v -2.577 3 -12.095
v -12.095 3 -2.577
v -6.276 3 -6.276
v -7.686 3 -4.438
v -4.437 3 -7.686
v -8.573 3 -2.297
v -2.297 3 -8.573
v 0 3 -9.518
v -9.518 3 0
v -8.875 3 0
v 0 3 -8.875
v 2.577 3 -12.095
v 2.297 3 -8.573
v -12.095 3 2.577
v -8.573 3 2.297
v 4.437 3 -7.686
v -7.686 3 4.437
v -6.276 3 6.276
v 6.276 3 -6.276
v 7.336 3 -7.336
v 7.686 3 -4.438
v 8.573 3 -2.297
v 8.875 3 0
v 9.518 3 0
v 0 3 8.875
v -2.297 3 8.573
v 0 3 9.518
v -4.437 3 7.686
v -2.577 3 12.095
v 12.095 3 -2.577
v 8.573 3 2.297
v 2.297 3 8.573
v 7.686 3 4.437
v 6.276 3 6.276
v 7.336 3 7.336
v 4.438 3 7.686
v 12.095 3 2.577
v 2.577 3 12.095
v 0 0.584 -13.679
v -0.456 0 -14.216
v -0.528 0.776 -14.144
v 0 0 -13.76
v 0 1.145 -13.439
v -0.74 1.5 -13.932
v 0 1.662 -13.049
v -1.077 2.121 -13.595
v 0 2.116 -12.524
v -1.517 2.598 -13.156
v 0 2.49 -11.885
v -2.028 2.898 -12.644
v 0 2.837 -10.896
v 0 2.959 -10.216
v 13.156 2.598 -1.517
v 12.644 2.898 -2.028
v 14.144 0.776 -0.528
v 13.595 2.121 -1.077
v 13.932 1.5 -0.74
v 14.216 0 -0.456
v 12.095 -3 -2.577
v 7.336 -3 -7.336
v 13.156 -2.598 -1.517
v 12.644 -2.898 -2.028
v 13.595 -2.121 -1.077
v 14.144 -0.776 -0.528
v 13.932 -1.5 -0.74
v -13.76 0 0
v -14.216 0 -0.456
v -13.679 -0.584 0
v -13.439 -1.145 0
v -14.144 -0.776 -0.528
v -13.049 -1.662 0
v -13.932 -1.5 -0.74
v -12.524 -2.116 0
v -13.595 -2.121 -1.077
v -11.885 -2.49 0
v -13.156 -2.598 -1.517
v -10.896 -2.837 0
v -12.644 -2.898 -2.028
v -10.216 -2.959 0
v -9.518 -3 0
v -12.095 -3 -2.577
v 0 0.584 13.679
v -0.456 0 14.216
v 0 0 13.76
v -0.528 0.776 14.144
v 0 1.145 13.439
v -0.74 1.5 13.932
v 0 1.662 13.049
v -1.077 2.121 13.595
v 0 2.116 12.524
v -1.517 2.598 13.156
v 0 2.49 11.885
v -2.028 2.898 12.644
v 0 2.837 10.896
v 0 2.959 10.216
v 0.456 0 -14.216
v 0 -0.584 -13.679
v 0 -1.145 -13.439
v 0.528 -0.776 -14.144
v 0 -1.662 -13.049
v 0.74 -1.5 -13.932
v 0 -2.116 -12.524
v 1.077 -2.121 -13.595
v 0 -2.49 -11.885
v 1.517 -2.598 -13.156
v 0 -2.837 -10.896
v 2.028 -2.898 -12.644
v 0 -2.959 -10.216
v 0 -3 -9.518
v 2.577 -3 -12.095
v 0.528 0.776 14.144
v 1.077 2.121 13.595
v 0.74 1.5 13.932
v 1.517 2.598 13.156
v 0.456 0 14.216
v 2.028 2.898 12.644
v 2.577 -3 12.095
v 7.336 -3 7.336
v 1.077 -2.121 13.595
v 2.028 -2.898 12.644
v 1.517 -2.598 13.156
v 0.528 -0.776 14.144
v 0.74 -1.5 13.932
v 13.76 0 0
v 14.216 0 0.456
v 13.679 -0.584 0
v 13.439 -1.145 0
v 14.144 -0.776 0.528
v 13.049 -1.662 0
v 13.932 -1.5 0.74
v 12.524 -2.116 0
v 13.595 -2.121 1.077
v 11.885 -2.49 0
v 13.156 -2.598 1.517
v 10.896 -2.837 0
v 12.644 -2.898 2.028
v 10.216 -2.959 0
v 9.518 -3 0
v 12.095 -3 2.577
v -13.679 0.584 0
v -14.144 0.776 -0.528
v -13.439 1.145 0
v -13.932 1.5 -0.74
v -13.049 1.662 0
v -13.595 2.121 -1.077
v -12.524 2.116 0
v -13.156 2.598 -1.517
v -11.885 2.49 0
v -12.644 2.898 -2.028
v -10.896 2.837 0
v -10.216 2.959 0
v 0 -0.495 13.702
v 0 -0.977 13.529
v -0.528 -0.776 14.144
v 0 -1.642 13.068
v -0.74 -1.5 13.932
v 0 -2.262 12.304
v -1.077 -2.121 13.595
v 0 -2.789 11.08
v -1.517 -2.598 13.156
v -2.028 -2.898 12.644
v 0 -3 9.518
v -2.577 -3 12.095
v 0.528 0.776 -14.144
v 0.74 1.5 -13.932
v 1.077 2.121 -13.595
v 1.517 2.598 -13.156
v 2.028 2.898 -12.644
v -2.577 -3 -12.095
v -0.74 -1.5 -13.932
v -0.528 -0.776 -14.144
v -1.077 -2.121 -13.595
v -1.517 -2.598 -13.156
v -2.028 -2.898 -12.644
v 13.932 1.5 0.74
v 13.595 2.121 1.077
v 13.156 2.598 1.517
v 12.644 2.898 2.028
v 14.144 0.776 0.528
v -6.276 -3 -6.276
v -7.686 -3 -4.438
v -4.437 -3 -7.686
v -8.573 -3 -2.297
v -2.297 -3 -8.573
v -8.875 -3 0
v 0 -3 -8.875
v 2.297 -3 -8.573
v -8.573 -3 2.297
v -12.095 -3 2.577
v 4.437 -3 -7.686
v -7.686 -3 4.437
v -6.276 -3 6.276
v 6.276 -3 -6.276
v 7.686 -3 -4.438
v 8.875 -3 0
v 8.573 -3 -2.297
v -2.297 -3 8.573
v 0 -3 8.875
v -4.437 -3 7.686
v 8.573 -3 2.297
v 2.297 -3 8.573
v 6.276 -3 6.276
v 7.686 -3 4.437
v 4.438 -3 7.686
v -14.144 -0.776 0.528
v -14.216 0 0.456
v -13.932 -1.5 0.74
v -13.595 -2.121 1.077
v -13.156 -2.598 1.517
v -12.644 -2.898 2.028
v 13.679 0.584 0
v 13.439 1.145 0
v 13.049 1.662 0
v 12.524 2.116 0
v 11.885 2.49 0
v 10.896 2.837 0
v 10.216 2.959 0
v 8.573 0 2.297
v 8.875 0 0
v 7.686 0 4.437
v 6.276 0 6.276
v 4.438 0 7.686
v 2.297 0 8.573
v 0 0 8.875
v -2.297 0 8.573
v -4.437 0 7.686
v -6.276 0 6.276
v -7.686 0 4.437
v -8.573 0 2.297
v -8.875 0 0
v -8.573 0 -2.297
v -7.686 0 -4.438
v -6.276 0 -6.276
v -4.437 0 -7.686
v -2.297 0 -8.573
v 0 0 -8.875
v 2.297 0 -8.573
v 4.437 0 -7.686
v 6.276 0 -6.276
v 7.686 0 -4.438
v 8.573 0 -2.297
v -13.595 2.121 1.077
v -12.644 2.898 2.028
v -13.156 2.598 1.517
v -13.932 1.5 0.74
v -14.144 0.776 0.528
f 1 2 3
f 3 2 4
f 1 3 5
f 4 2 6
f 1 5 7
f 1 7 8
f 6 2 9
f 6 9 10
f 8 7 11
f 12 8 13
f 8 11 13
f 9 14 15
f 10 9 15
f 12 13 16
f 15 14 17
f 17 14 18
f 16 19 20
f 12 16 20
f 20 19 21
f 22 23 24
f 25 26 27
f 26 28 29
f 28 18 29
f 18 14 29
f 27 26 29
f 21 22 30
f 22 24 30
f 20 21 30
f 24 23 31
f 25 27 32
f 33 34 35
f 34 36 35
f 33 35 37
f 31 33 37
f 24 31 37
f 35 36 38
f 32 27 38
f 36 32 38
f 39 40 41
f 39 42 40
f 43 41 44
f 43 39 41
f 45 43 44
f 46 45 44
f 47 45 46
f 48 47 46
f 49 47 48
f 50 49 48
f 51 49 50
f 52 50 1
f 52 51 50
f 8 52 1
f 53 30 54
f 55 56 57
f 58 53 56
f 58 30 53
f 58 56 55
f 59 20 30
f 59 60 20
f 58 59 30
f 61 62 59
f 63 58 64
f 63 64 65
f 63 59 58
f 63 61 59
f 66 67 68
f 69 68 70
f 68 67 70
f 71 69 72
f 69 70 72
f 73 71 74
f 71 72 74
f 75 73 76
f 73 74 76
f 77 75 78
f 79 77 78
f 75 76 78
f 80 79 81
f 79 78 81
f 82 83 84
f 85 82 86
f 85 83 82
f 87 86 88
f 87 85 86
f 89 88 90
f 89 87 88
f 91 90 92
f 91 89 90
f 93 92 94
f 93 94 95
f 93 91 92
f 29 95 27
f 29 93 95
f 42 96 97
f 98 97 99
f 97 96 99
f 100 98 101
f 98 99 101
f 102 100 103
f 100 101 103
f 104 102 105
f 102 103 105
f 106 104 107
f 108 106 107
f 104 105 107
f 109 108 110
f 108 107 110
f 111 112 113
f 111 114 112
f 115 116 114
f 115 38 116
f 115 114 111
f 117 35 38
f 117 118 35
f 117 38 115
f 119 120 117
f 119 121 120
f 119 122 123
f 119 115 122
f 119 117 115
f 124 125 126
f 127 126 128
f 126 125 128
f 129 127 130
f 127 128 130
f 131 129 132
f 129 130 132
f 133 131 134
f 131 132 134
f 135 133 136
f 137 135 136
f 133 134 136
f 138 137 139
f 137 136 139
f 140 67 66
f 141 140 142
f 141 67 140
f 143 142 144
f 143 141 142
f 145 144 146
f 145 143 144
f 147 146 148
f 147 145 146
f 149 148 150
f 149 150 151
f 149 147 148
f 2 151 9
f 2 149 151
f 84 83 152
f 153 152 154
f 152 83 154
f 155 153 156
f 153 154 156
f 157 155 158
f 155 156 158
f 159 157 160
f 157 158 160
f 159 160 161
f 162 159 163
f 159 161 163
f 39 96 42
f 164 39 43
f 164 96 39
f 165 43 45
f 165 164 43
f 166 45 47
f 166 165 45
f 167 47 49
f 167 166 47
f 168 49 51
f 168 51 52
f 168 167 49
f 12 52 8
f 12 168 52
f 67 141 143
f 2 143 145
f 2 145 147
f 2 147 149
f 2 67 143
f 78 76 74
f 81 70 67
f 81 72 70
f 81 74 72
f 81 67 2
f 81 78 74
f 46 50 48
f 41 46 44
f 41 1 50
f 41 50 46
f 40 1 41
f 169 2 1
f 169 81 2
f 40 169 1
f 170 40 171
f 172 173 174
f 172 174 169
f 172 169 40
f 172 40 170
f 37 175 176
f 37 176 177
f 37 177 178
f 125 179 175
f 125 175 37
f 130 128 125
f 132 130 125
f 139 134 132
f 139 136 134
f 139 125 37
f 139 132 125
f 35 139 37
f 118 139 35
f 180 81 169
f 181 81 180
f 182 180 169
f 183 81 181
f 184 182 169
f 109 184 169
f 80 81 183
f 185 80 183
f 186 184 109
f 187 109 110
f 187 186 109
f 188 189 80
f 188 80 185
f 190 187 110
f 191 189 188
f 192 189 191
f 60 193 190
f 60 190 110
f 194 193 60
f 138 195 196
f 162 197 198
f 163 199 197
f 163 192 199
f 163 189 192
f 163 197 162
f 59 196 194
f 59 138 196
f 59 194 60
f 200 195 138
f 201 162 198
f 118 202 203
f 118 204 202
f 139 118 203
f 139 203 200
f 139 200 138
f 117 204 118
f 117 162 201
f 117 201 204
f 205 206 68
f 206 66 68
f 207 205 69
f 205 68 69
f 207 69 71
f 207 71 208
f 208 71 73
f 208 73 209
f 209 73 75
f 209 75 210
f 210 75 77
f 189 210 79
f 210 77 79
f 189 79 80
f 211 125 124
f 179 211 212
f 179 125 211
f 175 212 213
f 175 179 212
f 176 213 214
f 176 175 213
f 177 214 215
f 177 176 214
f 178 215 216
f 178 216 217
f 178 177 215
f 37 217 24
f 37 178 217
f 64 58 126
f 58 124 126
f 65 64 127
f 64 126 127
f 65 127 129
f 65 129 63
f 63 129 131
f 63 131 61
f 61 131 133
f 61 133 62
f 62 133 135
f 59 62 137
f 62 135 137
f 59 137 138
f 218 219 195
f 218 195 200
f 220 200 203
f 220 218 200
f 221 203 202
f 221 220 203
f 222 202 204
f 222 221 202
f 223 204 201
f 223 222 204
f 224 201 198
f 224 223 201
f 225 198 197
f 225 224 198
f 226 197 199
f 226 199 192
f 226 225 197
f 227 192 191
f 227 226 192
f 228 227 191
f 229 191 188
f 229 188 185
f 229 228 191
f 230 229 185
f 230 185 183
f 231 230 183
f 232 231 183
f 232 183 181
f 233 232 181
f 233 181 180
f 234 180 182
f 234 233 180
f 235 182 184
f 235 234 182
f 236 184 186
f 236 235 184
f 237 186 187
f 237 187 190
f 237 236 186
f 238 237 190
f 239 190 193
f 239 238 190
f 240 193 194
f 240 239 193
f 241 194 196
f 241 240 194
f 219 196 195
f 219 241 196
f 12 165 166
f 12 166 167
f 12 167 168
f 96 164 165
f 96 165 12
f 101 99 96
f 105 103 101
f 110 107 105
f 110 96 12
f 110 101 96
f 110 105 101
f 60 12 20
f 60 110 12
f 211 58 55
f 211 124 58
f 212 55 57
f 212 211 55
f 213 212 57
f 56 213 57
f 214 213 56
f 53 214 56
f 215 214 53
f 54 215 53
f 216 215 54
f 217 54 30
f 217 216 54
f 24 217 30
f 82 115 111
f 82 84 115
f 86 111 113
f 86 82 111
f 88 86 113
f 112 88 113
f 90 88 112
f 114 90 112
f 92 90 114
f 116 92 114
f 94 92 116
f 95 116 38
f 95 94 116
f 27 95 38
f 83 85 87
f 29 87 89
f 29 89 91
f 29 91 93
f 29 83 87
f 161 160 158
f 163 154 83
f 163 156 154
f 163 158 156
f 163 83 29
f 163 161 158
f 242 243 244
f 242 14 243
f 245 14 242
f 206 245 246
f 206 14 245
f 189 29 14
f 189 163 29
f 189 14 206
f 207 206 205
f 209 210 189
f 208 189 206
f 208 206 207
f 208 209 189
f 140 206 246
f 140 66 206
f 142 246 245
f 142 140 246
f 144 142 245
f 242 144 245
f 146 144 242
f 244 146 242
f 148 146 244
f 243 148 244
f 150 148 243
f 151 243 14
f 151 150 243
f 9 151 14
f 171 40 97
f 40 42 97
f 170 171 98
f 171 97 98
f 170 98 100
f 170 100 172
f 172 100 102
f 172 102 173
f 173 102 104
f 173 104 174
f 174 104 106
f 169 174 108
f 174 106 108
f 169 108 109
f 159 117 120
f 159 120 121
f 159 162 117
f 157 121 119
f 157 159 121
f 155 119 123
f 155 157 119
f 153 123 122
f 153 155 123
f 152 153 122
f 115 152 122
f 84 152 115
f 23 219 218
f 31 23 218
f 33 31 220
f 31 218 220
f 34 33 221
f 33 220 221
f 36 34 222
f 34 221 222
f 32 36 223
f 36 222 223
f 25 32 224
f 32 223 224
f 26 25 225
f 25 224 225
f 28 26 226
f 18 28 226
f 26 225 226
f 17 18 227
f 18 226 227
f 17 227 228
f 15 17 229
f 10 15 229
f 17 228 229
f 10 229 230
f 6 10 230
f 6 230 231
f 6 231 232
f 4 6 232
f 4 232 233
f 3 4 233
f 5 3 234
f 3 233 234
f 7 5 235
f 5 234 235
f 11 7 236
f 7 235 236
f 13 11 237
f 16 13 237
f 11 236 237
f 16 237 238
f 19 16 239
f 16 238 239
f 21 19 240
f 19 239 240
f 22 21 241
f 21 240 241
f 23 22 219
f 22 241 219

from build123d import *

# Parameters (mm, degrees)
F0_R          = 8.875
F1_DEPTH      = 3
F1_DEPTH_BACK = 3
F2_R          = 2.99999


# Not quite as in the source:
# - a fillet or chamfer is up to 0.001 mm smaller than in the source, because OpenCascade refuses the exact size


with BuildPart() as f1:
    # F0 (on Front) → F1 (new body, two sides)
    with BuildSketch(Plane.XZ) as f1_sk:
        with BuildLine():
            ThreePointArc((-7.3362328356, 7.3362328741), (1.36e-08, 10.375), (7.3362328548, 7.3362328548))
            Line((7.3362328548, 7.3362328548), (0.4560838739, 14.2163818358))
            Line((0.4560838739, 14.2163818358), (0, 13.7602979619))
            Line((0, 13.7602979619), (-0.4560838739, 14.2163818358))
            Line((-0.4560838739, 14.2163818358), (-7.3362328356, 7.3362328741))
        make_face()
        with BuildLine():
            ThreePointArc((-7.3362328073, -7.3362329024), (-10.375, -2e-08), (-7.3362328356, 7.3362328741))
            Line((-7.3362328356, 7.3362328741), (-14.2163818358, 0.4560838739))
            Line((-14.2163818358, 0.4560838739), (-13.7602979619, 0))
            Line((-13.7602979619, 0), (-14.2163818358, -0.4560838739))
            Line((-14.2163818358, -0.4560838739), (-7.3362328073, -7.3362329024))
        make_face()
        with BuildLine():
            ThreePointArc((7.3362328617, -7.3362328479), (9.5852501517, -3.9703406063), (10.375, 0))
            ThreePointArc((10.375, 0), (9.5852501498, 3.9703406108), (7.3362328548, 7.3362328548))
            ThreePointArc((7.3362328548, 7.3362328548), (1.36e-08, 10.375), (-7.3362328356, 7.3362328741))
            ThreePointArc((-7.3362328356, 7.3362328741), (-10.375, -2e-08), (-7.3362328073, -7.3362329024))
            ThreePointArc((-7.3362328073, -7.3362329024), (3.85e-08, -10.375), (7.3362328617, -7.3362328479))
        make_face()
        Circle(F0_R, mode=Mode.SUBTRACT)
        with BuildLine():
            ThreePointArc((7.3362328548, 7.3362328548), (9.5852501498, 3.9703406108), (10.375, 0))
            ThreePointArc((10.375, 0), (9.5852501517, -3.9703406063), (7.3362328617, -7.3362328479))
            Line((7.3362328617, -7.3362328479), (14.2163818358, -0.4560838739))
            Line((14.2163818358, -0.4560838739), (13.7602979619, 0))
            Line((13.7602979619, 0), (14.2163818358, 0.4560838739))
            Line((14.2163818358, 0.4560838739), (7.3362328548, 7.3362328548))
        make_face()
        with BuildLine():
            Line((0.4560838739, -14.2163818358), (7.3362328617, -7.3362328479))
            ThreePointArc((7.3362328617, -7.3362328479), (3.85e-08, -10.375), (-7.3362328073, -7.3362329024))
            Line((-7.3362328073, -7.3362329024), (-0.4560838739, -14.2163818358))
            Line((-0.4560838739, -14.2163818358), (0, -13.7602979619))
            Line((0, -13.7602979619), (0.4560838739, -14.2163818358))
        make_face()
    extrude(amount=F1_DEPTH)
    extrude(f1_sk.sketch, amount=-F1_DEPTH_BACK)

    # F2 (radius 3 in the source; OpenCascade refuses exactly that, so slightly less here)
    f2_edges = [f1.edges().sort_by_distance(p)[0] for p in [
        (0.228042, -3, 13.98834),
        (-0.228042, -3, 13.98834),
        (13.98834, -3, 0.228042),
        (13.98834, -3, -0.228042),
        (0.228042, -3, -13.98834),
        (-0.228042, -3, -13.98834),
        (-13.98834, -3, 0.228042),
        (-13.98834, -3, -0.228042),
        (-13.98834, 3, 0.228042),
        (-13.98834, 3, -0.228042),
        (-0.228042, 3, -13.98834),
        (0.228042, 3, -13.98834),
        (13.98834, 3, 0.228042),
        (13.98834, 3, -0.228042),
        (0.228042, 3, 13.98834),
        (-0.228042, 3, 13.98834),
    ]]
    fillet(f2_edges, radius=F2_R)


solid = f1.part
